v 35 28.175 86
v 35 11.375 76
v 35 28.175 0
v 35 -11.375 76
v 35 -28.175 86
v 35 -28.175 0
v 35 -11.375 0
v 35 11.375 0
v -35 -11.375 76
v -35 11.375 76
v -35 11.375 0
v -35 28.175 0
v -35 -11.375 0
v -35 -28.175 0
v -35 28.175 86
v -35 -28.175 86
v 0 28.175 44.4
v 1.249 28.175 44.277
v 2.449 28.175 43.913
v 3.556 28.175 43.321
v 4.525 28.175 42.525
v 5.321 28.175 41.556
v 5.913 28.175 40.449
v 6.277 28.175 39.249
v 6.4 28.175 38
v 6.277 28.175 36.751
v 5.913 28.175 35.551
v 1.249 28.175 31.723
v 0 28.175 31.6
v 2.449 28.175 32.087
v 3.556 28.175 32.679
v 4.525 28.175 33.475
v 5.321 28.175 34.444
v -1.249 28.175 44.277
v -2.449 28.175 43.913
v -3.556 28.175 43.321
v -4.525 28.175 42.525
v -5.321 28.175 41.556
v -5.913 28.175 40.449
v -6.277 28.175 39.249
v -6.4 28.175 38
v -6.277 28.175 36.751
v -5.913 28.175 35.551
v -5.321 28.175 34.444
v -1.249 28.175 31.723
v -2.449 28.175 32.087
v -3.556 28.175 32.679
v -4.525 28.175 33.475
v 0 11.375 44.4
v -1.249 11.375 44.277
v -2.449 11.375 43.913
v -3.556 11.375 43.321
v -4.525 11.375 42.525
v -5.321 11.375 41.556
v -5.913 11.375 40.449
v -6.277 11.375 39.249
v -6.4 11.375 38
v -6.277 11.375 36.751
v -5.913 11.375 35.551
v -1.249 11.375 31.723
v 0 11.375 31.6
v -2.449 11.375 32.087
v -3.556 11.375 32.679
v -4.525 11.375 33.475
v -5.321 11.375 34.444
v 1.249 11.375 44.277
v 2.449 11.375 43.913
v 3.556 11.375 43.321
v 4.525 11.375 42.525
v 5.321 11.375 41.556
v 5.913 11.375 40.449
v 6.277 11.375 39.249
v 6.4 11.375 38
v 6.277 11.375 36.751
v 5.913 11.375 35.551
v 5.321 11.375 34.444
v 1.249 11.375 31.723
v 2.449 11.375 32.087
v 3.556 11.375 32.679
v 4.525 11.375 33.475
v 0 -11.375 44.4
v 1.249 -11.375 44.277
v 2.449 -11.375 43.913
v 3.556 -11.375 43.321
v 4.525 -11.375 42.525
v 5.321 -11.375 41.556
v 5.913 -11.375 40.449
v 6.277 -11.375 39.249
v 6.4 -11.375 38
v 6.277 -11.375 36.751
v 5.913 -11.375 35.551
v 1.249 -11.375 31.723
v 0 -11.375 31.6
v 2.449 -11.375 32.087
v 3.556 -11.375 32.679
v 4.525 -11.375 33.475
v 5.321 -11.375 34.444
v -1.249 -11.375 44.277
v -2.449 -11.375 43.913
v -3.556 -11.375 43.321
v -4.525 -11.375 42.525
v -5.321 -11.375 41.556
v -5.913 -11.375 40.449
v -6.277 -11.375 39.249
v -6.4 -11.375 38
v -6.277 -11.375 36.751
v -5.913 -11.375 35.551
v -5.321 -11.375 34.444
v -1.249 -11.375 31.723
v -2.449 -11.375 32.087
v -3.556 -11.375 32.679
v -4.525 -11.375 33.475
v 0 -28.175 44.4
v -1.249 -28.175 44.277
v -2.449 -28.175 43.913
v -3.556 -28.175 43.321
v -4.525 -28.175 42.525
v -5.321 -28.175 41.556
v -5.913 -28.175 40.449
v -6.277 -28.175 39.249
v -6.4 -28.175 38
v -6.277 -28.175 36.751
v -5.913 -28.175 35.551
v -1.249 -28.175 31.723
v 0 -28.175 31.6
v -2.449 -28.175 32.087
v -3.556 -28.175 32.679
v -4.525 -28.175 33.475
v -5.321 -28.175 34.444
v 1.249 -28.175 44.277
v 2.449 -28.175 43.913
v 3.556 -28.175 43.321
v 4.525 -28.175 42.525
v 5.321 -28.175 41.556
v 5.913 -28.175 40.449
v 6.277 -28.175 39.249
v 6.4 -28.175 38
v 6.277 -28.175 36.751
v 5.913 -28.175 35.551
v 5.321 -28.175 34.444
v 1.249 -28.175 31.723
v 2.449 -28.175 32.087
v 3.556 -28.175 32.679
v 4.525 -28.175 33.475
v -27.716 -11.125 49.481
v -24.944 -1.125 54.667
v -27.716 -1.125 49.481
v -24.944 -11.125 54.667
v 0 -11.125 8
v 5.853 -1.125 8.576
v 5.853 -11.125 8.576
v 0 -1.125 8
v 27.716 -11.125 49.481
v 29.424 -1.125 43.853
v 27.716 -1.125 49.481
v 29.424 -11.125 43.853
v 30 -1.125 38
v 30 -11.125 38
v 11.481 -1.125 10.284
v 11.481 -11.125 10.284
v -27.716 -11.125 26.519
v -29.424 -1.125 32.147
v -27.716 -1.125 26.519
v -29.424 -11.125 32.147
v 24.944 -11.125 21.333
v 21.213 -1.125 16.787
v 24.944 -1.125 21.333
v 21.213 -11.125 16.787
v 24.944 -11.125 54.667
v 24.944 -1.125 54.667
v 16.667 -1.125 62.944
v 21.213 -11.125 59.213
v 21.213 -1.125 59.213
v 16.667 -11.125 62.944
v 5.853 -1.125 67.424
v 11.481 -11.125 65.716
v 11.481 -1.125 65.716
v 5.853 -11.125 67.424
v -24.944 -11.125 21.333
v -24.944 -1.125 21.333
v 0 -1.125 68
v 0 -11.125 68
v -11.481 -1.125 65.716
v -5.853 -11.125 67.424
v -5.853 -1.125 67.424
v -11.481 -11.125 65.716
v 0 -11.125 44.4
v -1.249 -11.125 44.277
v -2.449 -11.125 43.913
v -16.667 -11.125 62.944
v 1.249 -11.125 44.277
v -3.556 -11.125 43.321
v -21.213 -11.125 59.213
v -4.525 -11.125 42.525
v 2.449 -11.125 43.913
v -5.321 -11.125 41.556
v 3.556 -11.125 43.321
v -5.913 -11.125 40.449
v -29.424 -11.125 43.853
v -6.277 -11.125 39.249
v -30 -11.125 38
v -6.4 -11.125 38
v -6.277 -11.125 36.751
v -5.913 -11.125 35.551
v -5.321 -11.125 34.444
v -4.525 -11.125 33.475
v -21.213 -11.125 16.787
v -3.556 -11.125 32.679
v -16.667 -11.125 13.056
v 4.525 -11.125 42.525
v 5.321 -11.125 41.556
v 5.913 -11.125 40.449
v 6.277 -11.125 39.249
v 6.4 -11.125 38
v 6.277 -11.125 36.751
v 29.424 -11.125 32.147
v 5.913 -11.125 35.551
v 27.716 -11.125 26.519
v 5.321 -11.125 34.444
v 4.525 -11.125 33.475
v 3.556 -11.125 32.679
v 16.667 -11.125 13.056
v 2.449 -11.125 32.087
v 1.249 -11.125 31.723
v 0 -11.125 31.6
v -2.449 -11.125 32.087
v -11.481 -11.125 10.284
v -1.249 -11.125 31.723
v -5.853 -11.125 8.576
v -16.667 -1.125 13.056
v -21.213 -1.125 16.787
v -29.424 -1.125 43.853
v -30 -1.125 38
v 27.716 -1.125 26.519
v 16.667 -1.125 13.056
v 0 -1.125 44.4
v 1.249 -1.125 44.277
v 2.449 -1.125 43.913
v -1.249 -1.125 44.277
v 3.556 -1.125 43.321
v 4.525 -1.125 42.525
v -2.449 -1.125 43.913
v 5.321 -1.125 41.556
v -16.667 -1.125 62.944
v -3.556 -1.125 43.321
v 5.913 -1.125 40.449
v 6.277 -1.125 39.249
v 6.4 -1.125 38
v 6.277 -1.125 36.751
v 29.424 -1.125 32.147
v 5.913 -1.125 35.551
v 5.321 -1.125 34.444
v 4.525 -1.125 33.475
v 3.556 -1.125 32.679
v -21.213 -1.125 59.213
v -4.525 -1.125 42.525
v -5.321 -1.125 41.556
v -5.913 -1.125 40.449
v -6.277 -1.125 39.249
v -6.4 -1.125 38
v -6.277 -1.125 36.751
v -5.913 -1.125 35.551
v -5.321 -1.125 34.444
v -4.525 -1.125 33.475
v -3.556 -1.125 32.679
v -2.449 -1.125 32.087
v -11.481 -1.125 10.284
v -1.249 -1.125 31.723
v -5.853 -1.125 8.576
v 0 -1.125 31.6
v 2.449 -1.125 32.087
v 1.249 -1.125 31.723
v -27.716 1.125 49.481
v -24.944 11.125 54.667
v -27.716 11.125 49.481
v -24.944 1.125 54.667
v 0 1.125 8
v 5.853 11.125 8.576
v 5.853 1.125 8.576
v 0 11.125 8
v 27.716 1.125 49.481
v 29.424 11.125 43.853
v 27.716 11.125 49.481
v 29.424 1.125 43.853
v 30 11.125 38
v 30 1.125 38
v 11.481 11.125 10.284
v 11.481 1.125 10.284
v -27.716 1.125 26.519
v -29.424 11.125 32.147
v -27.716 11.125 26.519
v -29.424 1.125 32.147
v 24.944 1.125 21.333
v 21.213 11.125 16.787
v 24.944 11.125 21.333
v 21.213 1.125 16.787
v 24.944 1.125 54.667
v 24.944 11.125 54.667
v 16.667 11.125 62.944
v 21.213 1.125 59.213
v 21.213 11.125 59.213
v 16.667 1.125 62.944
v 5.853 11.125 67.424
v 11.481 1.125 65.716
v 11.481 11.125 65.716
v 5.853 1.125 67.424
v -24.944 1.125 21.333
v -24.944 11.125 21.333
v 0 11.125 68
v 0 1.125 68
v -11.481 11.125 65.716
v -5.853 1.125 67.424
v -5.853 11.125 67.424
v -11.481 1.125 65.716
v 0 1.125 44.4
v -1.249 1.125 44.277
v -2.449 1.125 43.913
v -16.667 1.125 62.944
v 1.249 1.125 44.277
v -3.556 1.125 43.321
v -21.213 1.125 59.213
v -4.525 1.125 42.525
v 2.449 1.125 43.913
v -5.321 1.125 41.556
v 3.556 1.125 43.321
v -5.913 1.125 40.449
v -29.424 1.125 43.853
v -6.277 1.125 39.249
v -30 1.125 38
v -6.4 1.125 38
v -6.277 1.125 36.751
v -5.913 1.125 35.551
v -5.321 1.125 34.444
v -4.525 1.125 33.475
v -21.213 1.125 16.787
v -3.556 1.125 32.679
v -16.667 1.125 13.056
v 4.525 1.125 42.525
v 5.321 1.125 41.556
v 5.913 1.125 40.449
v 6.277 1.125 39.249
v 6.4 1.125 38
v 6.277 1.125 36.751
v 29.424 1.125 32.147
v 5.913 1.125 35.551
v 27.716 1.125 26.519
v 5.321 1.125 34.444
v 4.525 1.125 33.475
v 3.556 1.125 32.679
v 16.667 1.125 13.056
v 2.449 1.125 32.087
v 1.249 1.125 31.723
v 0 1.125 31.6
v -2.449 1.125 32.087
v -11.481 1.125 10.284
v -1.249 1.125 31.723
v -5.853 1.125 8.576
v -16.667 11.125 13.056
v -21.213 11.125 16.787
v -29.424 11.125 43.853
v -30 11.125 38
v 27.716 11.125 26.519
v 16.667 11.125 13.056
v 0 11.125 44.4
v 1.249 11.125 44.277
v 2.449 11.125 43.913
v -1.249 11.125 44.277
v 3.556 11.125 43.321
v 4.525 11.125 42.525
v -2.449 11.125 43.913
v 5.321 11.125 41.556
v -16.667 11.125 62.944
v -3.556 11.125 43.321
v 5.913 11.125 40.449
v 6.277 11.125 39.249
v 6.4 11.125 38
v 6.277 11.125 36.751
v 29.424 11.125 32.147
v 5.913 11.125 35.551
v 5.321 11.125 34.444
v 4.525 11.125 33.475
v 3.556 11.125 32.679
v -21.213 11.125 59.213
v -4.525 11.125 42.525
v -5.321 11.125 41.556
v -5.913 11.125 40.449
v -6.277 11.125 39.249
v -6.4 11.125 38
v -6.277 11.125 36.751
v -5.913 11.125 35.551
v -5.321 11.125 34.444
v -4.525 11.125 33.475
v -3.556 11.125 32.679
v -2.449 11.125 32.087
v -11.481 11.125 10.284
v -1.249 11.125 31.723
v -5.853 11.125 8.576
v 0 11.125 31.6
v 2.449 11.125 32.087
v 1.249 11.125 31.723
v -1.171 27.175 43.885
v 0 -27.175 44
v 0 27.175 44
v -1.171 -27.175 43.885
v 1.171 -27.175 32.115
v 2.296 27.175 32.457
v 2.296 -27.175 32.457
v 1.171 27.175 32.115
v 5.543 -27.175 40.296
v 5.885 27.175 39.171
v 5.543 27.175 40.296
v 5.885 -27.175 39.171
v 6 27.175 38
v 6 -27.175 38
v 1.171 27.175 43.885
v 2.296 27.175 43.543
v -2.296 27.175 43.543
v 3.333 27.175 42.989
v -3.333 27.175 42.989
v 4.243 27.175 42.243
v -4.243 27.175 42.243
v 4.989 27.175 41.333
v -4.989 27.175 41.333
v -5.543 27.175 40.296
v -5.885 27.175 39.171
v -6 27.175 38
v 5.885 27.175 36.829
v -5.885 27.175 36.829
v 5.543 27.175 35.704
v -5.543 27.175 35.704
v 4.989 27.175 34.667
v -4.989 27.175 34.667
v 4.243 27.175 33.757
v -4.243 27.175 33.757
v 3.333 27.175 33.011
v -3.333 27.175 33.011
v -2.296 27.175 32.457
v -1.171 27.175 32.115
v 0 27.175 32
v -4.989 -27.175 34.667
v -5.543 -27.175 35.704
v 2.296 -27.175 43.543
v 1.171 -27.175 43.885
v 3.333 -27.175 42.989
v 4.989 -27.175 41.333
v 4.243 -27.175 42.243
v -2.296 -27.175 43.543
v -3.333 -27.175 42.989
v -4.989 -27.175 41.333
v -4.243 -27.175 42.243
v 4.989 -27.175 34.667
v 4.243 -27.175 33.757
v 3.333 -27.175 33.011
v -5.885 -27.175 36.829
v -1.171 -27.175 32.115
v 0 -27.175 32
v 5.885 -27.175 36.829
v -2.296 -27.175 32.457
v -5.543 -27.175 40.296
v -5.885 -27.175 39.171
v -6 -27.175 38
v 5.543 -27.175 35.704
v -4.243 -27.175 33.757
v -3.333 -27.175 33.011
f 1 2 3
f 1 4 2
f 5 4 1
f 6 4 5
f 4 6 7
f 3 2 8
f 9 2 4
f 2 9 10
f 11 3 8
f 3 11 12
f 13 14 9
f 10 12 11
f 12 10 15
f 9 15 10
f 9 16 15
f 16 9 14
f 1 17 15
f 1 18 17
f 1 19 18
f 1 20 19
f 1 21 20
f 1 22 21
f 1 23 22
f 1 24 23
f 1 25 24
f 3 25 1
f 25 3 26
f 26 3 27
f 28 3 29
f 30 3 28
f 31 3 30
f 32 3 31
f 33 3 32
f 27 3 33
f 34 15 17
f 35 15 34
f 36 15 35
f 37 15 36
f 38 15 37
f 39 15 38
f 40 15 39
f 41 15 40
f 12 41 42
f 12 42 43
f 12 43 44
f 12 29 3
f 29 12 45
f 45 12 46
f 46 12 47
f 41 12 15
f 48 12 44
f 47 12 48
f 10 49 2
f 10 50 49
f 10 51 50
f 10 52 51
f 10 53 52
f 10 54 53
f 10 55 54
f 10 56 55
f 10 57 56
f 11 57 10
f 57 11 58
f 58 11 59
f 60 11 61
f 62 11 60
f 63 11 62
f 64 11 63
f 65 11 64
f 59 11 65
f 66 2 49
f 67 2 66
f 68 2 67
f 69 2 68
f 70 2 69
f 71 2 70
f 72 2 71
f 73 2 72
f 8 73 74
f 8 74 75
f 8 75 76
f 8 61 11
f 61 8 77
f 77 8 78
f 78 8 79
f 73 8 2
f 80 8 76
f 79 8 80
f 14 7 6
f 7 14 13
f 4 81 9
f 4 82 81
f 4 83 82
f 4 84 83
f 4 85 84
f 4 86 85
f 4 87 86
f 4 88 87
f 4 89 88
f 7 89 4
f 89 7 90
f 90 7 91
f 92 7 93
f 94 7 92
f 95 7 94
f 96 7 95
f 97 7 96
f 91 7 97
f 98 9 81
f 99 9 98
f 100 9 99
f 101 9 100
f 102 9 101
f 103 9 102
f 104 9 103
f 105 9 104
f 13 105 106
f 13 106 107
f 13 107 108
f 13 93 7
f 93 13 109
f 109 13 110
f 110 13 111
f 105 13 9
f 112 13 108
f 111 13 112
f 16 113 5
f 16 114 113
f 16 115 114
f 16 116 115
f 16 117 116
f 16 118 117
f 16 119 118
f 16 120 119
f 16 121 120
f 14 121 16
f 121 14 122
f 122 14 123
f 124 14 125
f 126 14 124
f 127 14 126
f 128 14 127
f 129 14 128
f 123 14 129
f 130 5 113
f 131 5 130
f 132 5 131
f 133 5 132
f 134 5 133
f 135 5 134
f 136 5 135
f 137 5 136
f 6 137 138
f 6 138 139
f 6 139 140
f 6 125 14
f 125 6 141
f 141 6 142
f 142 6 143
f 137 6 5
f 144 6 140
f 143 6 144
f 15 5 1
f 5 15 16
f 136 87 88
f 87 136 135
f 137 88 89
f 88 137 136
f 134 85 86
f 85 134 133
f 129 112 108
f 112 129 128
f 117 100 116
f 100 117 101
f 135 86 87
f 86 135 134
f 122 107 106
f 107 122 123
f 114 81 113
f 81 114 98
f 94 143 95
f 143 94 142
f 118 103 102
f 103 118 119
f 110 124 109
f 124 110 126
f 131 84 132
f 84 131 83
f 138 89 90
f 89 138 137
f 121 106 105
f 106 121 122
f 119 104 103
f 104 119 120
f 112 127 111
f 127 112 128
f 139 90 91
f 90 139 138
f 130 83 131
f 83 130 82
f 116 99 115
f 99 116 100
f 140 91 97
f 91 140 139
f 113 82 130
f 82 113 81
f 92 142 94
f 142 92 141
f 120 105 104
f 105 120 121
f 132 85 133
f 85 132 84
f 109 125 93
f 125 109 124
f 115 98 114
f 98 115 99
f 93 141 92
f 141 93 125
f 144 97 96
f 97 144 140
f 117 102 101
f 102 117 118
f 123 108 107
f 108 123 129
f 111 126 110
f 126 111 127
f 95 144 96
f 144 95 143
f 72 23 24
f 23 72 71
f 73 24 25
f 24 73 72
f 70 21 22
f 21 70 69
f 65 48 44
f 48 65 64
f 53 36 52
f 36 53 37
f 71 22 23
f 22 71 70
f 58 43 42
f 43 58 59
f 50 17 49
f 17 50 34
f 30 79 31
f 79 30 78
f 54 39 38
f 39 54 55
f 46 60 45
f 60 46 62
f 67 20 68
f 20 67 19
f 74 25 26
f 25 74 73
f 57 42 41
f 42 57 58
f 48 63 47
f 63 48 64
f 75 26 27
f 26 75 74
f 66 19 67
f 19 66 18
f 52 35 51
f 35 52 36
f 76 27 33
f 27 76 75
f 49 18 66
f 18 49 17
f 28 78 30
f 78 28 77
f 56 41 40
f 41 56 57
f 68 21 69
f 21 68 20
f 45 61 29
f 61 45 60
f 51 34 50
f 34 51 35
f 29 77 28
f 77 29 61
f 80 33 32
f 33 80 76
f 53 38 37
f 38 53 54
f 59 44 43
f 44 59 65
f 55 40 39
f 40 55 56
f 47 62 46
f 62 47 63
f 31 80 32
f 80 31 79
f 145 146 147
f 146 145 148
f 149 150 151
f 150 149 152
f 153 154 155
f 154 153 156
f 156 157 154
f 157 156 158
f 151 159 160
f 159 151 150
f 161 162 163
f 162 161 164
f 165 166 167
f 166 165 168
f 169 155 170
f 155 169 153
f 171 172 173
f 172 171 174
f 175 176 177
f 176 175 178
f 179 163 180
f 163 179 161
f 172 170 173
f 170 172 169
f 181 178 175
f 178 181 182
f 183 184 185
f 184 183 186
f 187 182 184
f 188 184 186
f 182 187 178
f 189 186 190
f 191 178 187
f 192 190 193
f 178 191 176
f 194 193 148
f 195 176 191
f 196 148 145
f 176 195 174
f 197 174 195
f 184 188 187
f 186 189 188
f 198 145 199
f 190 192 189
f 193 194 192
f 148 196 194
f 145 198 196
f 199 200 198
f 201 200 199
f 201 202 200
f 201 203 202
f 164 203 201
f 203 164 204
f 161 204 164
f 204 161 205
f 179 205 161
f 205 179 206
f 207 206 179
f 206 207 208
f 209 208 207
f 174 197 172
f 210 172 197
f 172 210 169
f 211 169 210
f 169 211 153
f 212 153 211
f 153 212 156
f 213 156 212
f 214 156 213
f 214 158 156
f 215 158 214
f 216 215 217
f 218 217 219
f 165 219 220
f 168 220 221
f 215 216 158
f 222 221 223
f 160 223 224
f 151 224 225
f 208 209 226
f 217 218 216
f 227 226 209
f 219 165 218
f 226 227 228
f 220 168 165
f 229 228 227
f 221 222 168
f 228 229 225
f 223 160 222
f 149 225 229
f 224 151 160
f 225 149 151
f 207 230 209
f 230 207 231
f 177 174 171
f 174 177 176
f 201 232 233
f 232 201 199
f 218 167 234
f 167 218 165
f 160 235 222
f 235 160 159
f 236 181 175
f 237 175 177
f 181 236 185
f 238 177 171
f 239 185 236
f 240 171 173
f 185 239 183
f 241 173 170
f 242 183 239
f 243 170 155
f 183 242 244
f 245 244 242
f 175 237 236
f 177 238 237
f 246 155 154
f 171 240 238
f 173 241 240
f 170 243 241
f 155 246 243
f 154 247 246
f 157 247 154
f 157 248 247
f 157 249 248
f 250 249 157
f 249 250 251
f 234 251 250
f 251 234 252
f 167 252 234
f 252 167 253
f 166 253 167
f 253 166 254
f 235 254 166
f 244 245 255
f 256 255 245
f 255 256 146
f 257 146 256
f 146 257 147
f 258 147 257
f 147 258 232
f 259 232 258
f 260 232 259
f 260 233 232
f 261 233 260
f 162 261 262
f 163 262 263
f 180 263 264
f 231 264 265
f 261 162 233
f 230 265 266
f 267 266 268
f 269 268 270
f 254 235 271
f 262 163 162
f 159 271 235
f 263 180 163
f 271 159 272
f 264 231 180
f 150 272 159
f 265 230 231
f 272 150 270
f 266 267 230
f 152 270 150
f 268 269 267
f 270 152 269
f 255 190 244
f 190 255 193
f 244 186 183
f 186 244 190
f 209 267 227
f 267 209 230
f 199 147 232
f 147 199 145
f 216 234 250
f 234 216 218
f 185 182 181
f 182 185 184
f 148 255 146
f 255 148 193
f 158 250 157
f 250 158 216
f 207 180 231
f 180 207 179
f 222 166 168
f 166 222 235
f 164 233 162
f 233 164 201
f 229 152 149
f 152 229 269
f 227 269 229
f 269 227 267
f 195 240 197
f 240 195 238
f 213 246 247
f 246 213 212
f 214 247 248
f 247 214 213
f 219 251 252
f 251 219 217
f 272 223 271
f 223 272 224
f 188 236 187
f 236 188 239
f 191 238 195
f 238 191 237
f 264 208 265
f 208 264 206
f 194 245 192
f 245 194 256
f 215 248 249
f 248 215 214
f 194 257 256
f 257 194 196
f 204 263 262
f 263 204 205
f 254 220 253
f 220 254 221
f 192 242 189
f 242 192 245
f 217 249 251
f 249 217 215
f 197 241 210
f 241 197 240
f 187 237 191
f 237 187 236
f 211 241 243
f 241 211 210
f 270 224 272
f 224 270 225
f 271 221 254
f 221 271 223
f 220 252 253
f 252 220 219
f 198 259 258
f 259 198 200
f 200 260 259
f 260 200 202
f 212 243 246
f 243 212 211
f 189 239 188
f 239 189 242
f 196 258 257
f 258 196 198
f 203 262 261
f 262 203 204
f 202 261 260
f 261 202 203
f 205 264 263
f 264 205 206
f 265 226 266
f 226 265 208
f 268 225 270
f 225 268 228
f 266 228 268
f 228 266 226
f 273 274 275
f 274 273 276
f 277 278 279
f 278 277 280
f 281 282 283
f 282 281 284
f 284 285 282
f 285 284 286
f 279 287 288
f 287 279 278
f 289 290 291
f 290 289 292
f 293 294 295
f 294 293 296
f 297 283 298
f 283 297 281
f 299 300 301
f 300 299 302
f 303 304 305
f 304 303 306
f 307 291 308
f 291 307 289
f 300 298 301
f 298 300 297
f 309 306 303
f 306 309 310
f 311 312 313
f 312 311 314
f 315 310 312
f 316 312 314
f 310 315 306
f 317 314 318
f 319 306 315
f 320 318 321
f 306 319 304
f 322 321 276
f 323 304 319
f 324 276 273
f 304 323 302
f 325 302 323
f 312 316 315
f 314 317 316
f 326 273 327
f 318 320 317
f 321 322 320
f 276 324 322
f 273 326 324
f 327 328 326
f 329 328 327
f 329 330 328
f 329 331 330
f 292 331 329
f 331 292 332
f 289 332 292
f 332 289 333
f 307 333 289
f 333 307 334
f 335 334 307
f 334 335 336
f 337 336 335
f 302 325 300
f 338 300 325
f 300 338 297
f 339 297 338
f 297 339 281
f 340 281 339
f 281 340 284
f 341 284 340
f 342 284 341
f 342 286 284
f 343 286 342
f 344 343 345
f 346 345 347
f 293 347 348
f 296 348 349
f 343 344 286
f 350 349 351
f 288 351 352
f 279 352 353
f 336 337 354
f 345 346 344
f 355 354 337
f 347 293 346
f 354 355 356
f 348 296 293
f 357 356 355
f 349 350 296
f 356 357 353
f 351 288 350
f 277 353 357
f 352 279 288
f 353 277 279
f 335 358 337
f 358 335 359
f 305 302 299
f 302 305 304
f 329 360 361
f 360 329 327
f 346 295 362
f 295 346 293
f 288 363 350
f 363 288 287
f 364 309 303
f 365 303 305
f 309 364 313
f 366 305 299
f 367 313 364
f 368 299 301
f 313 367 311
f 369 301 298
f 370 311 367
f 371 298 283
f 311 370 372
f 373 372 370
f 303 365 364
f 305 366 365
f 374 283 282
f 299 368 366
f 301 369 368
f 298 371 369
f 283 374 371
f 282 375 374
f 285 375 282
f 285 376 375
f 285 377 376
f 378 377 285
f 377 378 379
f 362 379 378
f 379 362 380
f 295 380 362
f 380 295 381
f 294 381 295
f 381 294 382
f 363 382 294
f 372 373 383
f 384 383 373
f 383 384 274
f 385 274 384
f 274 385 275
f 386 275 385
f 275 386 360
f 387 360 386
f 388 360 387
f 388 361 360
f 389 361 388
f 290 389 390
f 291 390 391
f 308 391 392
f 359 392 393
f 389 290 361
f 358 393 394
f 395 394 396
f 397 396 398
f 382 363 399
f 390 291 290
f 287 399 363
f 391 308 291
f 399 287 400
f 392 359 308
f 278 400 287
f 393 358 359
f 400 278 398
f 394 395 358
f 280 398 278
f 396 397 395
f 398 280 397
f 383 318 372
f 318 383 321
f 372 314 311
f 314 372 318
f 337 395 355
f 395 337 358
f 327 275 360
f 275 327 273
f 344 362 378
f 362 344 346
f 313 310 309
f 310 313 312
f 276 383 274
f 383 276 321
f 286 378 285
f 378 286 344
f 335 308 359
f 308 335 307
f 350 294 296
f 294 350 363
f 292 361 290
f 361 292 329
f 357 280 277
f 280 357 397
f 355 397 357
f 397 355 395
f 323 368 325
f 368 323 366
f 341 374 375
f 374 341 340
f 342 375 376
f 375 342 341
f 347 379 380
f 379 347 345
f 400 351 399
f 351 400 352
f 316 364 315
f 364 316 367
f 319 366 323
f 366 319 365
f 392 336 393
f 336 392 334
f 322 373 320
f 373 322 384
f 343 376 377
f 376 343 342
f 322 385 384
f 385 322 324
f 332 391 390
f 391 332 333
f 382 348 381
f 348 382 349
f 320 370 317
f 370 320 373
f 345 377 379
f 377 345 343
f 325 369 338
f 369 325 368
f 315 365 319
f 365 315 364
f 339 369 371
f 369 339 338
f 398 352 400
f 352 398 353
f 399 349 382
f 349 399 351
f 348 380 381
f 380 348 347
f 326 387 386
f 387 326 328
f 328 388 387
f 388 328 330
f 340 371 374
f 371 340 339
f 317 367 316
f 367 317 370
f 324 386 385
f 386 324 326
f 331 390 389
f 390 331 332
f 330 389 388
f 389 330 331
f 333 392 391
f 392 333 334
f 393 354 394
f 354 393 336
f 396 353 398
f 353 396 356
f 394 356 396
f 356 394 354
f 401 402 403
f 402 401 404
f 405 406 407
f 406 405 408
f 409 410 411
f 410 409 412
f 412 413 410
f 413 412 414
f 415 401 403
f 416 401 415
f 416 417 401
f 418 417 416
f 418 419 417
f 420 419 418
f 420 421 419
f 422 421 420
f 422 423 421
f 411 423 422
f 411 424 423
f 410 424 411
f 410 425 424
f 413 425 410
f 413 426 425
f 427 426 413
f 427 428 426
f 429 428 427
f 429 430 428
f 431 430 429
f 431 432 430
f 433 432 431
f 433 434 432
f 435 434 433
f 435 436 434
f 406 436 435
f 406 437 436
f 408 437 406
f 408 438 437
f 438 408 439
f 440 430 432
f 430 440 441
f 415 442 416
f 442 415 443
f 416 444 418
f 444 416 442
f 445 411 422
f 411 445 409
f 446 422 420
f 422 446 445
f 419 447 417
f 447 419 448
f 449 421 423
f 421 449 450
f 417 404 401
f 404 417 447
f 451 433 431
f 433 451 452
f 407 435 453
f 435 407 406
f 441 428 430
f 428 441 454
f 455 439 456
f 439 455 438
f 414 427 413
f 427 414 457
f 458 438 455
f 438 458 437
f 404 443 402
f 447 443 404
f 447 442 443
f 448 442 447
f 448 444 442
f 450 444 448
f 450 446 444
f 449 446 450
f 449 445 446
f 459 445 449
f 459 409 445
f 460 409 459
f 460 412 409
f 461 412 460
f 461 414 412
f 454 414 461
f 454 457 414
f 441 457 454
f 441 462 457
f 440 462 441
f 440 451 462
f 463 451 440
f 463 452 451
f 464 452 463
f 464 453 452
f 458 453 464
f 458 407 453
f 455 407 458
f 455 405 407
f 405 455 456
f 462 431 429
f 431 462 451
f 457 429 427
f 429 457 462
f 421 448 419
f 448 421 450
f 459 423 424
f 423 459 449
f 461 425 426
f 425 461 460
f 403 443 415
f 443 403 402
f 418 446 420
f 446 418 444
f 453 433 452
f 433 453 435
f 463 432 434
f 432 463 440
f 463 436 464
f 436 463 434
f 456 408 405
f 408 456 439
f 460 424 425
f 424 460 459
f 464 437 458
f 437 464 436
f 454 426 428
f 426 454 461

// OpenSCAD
$fn = 32;

// ------------------------------------------------------------------------
// Trolley wheel set: wheels d60, fork 76 mm tall
// Every part is its own module, assembly() places every instance.
// ------------------------------------------------------------------------

// --- part 1 ---
module trolley_fork() {
  difference() {
    union() {
      translate([-35, 11.375, 0]) cube([70, 16.8, 76]);
      translate([-35, -28.175, 0]) cube([70, 16.8, 76]);
      translate([-35, -28.175, 76]) cube([70, 56.35, 10]);
    }
    translate([0, -19.775, 38]) rotate([90, 0, 0]) cylinder(h = 18.8, d = 12.8, center = true);
    translate([0, 19.775, 38]) rotate([90, 0, 0]) cylinder(h = 18.8, d = 12.8, center = true);
  }
}

// --- part 2 ---
module trolley_wheel() {
  difference() {
      translate([0, 0, 0]) cylinder(h = 10, d = 60);
      translate([0, 0, -1]) cylinder(h = 12, d = 12.8);
    }
}

// --- part 3 ---
module trolley_axle() {
  translate([0, 0, -27.175]) cylinder(h = 54.35, d = 12);
}

// --- assembly ---
module assembly() {
  color([0.80, 0.24, 0.20]) translate([0, 0, 0]) rotate([0, 0, 0]) trolley_fork();
  color([0.20, 0.45, 0.75]) translate([0, -1.125, 38]) rotate([90, 0, 0]) trolley_wheel();
  color([0.25, 0.62, 0.32]) translate([0, 11.125, 38]) rotate([90, 0, 0]) trolley_wheel();
  color([0.92, 0.70, 0.18]) translate([0, 0, 38]) rotate([90, 0, 0]) trolley_axle();
}

assembly();
